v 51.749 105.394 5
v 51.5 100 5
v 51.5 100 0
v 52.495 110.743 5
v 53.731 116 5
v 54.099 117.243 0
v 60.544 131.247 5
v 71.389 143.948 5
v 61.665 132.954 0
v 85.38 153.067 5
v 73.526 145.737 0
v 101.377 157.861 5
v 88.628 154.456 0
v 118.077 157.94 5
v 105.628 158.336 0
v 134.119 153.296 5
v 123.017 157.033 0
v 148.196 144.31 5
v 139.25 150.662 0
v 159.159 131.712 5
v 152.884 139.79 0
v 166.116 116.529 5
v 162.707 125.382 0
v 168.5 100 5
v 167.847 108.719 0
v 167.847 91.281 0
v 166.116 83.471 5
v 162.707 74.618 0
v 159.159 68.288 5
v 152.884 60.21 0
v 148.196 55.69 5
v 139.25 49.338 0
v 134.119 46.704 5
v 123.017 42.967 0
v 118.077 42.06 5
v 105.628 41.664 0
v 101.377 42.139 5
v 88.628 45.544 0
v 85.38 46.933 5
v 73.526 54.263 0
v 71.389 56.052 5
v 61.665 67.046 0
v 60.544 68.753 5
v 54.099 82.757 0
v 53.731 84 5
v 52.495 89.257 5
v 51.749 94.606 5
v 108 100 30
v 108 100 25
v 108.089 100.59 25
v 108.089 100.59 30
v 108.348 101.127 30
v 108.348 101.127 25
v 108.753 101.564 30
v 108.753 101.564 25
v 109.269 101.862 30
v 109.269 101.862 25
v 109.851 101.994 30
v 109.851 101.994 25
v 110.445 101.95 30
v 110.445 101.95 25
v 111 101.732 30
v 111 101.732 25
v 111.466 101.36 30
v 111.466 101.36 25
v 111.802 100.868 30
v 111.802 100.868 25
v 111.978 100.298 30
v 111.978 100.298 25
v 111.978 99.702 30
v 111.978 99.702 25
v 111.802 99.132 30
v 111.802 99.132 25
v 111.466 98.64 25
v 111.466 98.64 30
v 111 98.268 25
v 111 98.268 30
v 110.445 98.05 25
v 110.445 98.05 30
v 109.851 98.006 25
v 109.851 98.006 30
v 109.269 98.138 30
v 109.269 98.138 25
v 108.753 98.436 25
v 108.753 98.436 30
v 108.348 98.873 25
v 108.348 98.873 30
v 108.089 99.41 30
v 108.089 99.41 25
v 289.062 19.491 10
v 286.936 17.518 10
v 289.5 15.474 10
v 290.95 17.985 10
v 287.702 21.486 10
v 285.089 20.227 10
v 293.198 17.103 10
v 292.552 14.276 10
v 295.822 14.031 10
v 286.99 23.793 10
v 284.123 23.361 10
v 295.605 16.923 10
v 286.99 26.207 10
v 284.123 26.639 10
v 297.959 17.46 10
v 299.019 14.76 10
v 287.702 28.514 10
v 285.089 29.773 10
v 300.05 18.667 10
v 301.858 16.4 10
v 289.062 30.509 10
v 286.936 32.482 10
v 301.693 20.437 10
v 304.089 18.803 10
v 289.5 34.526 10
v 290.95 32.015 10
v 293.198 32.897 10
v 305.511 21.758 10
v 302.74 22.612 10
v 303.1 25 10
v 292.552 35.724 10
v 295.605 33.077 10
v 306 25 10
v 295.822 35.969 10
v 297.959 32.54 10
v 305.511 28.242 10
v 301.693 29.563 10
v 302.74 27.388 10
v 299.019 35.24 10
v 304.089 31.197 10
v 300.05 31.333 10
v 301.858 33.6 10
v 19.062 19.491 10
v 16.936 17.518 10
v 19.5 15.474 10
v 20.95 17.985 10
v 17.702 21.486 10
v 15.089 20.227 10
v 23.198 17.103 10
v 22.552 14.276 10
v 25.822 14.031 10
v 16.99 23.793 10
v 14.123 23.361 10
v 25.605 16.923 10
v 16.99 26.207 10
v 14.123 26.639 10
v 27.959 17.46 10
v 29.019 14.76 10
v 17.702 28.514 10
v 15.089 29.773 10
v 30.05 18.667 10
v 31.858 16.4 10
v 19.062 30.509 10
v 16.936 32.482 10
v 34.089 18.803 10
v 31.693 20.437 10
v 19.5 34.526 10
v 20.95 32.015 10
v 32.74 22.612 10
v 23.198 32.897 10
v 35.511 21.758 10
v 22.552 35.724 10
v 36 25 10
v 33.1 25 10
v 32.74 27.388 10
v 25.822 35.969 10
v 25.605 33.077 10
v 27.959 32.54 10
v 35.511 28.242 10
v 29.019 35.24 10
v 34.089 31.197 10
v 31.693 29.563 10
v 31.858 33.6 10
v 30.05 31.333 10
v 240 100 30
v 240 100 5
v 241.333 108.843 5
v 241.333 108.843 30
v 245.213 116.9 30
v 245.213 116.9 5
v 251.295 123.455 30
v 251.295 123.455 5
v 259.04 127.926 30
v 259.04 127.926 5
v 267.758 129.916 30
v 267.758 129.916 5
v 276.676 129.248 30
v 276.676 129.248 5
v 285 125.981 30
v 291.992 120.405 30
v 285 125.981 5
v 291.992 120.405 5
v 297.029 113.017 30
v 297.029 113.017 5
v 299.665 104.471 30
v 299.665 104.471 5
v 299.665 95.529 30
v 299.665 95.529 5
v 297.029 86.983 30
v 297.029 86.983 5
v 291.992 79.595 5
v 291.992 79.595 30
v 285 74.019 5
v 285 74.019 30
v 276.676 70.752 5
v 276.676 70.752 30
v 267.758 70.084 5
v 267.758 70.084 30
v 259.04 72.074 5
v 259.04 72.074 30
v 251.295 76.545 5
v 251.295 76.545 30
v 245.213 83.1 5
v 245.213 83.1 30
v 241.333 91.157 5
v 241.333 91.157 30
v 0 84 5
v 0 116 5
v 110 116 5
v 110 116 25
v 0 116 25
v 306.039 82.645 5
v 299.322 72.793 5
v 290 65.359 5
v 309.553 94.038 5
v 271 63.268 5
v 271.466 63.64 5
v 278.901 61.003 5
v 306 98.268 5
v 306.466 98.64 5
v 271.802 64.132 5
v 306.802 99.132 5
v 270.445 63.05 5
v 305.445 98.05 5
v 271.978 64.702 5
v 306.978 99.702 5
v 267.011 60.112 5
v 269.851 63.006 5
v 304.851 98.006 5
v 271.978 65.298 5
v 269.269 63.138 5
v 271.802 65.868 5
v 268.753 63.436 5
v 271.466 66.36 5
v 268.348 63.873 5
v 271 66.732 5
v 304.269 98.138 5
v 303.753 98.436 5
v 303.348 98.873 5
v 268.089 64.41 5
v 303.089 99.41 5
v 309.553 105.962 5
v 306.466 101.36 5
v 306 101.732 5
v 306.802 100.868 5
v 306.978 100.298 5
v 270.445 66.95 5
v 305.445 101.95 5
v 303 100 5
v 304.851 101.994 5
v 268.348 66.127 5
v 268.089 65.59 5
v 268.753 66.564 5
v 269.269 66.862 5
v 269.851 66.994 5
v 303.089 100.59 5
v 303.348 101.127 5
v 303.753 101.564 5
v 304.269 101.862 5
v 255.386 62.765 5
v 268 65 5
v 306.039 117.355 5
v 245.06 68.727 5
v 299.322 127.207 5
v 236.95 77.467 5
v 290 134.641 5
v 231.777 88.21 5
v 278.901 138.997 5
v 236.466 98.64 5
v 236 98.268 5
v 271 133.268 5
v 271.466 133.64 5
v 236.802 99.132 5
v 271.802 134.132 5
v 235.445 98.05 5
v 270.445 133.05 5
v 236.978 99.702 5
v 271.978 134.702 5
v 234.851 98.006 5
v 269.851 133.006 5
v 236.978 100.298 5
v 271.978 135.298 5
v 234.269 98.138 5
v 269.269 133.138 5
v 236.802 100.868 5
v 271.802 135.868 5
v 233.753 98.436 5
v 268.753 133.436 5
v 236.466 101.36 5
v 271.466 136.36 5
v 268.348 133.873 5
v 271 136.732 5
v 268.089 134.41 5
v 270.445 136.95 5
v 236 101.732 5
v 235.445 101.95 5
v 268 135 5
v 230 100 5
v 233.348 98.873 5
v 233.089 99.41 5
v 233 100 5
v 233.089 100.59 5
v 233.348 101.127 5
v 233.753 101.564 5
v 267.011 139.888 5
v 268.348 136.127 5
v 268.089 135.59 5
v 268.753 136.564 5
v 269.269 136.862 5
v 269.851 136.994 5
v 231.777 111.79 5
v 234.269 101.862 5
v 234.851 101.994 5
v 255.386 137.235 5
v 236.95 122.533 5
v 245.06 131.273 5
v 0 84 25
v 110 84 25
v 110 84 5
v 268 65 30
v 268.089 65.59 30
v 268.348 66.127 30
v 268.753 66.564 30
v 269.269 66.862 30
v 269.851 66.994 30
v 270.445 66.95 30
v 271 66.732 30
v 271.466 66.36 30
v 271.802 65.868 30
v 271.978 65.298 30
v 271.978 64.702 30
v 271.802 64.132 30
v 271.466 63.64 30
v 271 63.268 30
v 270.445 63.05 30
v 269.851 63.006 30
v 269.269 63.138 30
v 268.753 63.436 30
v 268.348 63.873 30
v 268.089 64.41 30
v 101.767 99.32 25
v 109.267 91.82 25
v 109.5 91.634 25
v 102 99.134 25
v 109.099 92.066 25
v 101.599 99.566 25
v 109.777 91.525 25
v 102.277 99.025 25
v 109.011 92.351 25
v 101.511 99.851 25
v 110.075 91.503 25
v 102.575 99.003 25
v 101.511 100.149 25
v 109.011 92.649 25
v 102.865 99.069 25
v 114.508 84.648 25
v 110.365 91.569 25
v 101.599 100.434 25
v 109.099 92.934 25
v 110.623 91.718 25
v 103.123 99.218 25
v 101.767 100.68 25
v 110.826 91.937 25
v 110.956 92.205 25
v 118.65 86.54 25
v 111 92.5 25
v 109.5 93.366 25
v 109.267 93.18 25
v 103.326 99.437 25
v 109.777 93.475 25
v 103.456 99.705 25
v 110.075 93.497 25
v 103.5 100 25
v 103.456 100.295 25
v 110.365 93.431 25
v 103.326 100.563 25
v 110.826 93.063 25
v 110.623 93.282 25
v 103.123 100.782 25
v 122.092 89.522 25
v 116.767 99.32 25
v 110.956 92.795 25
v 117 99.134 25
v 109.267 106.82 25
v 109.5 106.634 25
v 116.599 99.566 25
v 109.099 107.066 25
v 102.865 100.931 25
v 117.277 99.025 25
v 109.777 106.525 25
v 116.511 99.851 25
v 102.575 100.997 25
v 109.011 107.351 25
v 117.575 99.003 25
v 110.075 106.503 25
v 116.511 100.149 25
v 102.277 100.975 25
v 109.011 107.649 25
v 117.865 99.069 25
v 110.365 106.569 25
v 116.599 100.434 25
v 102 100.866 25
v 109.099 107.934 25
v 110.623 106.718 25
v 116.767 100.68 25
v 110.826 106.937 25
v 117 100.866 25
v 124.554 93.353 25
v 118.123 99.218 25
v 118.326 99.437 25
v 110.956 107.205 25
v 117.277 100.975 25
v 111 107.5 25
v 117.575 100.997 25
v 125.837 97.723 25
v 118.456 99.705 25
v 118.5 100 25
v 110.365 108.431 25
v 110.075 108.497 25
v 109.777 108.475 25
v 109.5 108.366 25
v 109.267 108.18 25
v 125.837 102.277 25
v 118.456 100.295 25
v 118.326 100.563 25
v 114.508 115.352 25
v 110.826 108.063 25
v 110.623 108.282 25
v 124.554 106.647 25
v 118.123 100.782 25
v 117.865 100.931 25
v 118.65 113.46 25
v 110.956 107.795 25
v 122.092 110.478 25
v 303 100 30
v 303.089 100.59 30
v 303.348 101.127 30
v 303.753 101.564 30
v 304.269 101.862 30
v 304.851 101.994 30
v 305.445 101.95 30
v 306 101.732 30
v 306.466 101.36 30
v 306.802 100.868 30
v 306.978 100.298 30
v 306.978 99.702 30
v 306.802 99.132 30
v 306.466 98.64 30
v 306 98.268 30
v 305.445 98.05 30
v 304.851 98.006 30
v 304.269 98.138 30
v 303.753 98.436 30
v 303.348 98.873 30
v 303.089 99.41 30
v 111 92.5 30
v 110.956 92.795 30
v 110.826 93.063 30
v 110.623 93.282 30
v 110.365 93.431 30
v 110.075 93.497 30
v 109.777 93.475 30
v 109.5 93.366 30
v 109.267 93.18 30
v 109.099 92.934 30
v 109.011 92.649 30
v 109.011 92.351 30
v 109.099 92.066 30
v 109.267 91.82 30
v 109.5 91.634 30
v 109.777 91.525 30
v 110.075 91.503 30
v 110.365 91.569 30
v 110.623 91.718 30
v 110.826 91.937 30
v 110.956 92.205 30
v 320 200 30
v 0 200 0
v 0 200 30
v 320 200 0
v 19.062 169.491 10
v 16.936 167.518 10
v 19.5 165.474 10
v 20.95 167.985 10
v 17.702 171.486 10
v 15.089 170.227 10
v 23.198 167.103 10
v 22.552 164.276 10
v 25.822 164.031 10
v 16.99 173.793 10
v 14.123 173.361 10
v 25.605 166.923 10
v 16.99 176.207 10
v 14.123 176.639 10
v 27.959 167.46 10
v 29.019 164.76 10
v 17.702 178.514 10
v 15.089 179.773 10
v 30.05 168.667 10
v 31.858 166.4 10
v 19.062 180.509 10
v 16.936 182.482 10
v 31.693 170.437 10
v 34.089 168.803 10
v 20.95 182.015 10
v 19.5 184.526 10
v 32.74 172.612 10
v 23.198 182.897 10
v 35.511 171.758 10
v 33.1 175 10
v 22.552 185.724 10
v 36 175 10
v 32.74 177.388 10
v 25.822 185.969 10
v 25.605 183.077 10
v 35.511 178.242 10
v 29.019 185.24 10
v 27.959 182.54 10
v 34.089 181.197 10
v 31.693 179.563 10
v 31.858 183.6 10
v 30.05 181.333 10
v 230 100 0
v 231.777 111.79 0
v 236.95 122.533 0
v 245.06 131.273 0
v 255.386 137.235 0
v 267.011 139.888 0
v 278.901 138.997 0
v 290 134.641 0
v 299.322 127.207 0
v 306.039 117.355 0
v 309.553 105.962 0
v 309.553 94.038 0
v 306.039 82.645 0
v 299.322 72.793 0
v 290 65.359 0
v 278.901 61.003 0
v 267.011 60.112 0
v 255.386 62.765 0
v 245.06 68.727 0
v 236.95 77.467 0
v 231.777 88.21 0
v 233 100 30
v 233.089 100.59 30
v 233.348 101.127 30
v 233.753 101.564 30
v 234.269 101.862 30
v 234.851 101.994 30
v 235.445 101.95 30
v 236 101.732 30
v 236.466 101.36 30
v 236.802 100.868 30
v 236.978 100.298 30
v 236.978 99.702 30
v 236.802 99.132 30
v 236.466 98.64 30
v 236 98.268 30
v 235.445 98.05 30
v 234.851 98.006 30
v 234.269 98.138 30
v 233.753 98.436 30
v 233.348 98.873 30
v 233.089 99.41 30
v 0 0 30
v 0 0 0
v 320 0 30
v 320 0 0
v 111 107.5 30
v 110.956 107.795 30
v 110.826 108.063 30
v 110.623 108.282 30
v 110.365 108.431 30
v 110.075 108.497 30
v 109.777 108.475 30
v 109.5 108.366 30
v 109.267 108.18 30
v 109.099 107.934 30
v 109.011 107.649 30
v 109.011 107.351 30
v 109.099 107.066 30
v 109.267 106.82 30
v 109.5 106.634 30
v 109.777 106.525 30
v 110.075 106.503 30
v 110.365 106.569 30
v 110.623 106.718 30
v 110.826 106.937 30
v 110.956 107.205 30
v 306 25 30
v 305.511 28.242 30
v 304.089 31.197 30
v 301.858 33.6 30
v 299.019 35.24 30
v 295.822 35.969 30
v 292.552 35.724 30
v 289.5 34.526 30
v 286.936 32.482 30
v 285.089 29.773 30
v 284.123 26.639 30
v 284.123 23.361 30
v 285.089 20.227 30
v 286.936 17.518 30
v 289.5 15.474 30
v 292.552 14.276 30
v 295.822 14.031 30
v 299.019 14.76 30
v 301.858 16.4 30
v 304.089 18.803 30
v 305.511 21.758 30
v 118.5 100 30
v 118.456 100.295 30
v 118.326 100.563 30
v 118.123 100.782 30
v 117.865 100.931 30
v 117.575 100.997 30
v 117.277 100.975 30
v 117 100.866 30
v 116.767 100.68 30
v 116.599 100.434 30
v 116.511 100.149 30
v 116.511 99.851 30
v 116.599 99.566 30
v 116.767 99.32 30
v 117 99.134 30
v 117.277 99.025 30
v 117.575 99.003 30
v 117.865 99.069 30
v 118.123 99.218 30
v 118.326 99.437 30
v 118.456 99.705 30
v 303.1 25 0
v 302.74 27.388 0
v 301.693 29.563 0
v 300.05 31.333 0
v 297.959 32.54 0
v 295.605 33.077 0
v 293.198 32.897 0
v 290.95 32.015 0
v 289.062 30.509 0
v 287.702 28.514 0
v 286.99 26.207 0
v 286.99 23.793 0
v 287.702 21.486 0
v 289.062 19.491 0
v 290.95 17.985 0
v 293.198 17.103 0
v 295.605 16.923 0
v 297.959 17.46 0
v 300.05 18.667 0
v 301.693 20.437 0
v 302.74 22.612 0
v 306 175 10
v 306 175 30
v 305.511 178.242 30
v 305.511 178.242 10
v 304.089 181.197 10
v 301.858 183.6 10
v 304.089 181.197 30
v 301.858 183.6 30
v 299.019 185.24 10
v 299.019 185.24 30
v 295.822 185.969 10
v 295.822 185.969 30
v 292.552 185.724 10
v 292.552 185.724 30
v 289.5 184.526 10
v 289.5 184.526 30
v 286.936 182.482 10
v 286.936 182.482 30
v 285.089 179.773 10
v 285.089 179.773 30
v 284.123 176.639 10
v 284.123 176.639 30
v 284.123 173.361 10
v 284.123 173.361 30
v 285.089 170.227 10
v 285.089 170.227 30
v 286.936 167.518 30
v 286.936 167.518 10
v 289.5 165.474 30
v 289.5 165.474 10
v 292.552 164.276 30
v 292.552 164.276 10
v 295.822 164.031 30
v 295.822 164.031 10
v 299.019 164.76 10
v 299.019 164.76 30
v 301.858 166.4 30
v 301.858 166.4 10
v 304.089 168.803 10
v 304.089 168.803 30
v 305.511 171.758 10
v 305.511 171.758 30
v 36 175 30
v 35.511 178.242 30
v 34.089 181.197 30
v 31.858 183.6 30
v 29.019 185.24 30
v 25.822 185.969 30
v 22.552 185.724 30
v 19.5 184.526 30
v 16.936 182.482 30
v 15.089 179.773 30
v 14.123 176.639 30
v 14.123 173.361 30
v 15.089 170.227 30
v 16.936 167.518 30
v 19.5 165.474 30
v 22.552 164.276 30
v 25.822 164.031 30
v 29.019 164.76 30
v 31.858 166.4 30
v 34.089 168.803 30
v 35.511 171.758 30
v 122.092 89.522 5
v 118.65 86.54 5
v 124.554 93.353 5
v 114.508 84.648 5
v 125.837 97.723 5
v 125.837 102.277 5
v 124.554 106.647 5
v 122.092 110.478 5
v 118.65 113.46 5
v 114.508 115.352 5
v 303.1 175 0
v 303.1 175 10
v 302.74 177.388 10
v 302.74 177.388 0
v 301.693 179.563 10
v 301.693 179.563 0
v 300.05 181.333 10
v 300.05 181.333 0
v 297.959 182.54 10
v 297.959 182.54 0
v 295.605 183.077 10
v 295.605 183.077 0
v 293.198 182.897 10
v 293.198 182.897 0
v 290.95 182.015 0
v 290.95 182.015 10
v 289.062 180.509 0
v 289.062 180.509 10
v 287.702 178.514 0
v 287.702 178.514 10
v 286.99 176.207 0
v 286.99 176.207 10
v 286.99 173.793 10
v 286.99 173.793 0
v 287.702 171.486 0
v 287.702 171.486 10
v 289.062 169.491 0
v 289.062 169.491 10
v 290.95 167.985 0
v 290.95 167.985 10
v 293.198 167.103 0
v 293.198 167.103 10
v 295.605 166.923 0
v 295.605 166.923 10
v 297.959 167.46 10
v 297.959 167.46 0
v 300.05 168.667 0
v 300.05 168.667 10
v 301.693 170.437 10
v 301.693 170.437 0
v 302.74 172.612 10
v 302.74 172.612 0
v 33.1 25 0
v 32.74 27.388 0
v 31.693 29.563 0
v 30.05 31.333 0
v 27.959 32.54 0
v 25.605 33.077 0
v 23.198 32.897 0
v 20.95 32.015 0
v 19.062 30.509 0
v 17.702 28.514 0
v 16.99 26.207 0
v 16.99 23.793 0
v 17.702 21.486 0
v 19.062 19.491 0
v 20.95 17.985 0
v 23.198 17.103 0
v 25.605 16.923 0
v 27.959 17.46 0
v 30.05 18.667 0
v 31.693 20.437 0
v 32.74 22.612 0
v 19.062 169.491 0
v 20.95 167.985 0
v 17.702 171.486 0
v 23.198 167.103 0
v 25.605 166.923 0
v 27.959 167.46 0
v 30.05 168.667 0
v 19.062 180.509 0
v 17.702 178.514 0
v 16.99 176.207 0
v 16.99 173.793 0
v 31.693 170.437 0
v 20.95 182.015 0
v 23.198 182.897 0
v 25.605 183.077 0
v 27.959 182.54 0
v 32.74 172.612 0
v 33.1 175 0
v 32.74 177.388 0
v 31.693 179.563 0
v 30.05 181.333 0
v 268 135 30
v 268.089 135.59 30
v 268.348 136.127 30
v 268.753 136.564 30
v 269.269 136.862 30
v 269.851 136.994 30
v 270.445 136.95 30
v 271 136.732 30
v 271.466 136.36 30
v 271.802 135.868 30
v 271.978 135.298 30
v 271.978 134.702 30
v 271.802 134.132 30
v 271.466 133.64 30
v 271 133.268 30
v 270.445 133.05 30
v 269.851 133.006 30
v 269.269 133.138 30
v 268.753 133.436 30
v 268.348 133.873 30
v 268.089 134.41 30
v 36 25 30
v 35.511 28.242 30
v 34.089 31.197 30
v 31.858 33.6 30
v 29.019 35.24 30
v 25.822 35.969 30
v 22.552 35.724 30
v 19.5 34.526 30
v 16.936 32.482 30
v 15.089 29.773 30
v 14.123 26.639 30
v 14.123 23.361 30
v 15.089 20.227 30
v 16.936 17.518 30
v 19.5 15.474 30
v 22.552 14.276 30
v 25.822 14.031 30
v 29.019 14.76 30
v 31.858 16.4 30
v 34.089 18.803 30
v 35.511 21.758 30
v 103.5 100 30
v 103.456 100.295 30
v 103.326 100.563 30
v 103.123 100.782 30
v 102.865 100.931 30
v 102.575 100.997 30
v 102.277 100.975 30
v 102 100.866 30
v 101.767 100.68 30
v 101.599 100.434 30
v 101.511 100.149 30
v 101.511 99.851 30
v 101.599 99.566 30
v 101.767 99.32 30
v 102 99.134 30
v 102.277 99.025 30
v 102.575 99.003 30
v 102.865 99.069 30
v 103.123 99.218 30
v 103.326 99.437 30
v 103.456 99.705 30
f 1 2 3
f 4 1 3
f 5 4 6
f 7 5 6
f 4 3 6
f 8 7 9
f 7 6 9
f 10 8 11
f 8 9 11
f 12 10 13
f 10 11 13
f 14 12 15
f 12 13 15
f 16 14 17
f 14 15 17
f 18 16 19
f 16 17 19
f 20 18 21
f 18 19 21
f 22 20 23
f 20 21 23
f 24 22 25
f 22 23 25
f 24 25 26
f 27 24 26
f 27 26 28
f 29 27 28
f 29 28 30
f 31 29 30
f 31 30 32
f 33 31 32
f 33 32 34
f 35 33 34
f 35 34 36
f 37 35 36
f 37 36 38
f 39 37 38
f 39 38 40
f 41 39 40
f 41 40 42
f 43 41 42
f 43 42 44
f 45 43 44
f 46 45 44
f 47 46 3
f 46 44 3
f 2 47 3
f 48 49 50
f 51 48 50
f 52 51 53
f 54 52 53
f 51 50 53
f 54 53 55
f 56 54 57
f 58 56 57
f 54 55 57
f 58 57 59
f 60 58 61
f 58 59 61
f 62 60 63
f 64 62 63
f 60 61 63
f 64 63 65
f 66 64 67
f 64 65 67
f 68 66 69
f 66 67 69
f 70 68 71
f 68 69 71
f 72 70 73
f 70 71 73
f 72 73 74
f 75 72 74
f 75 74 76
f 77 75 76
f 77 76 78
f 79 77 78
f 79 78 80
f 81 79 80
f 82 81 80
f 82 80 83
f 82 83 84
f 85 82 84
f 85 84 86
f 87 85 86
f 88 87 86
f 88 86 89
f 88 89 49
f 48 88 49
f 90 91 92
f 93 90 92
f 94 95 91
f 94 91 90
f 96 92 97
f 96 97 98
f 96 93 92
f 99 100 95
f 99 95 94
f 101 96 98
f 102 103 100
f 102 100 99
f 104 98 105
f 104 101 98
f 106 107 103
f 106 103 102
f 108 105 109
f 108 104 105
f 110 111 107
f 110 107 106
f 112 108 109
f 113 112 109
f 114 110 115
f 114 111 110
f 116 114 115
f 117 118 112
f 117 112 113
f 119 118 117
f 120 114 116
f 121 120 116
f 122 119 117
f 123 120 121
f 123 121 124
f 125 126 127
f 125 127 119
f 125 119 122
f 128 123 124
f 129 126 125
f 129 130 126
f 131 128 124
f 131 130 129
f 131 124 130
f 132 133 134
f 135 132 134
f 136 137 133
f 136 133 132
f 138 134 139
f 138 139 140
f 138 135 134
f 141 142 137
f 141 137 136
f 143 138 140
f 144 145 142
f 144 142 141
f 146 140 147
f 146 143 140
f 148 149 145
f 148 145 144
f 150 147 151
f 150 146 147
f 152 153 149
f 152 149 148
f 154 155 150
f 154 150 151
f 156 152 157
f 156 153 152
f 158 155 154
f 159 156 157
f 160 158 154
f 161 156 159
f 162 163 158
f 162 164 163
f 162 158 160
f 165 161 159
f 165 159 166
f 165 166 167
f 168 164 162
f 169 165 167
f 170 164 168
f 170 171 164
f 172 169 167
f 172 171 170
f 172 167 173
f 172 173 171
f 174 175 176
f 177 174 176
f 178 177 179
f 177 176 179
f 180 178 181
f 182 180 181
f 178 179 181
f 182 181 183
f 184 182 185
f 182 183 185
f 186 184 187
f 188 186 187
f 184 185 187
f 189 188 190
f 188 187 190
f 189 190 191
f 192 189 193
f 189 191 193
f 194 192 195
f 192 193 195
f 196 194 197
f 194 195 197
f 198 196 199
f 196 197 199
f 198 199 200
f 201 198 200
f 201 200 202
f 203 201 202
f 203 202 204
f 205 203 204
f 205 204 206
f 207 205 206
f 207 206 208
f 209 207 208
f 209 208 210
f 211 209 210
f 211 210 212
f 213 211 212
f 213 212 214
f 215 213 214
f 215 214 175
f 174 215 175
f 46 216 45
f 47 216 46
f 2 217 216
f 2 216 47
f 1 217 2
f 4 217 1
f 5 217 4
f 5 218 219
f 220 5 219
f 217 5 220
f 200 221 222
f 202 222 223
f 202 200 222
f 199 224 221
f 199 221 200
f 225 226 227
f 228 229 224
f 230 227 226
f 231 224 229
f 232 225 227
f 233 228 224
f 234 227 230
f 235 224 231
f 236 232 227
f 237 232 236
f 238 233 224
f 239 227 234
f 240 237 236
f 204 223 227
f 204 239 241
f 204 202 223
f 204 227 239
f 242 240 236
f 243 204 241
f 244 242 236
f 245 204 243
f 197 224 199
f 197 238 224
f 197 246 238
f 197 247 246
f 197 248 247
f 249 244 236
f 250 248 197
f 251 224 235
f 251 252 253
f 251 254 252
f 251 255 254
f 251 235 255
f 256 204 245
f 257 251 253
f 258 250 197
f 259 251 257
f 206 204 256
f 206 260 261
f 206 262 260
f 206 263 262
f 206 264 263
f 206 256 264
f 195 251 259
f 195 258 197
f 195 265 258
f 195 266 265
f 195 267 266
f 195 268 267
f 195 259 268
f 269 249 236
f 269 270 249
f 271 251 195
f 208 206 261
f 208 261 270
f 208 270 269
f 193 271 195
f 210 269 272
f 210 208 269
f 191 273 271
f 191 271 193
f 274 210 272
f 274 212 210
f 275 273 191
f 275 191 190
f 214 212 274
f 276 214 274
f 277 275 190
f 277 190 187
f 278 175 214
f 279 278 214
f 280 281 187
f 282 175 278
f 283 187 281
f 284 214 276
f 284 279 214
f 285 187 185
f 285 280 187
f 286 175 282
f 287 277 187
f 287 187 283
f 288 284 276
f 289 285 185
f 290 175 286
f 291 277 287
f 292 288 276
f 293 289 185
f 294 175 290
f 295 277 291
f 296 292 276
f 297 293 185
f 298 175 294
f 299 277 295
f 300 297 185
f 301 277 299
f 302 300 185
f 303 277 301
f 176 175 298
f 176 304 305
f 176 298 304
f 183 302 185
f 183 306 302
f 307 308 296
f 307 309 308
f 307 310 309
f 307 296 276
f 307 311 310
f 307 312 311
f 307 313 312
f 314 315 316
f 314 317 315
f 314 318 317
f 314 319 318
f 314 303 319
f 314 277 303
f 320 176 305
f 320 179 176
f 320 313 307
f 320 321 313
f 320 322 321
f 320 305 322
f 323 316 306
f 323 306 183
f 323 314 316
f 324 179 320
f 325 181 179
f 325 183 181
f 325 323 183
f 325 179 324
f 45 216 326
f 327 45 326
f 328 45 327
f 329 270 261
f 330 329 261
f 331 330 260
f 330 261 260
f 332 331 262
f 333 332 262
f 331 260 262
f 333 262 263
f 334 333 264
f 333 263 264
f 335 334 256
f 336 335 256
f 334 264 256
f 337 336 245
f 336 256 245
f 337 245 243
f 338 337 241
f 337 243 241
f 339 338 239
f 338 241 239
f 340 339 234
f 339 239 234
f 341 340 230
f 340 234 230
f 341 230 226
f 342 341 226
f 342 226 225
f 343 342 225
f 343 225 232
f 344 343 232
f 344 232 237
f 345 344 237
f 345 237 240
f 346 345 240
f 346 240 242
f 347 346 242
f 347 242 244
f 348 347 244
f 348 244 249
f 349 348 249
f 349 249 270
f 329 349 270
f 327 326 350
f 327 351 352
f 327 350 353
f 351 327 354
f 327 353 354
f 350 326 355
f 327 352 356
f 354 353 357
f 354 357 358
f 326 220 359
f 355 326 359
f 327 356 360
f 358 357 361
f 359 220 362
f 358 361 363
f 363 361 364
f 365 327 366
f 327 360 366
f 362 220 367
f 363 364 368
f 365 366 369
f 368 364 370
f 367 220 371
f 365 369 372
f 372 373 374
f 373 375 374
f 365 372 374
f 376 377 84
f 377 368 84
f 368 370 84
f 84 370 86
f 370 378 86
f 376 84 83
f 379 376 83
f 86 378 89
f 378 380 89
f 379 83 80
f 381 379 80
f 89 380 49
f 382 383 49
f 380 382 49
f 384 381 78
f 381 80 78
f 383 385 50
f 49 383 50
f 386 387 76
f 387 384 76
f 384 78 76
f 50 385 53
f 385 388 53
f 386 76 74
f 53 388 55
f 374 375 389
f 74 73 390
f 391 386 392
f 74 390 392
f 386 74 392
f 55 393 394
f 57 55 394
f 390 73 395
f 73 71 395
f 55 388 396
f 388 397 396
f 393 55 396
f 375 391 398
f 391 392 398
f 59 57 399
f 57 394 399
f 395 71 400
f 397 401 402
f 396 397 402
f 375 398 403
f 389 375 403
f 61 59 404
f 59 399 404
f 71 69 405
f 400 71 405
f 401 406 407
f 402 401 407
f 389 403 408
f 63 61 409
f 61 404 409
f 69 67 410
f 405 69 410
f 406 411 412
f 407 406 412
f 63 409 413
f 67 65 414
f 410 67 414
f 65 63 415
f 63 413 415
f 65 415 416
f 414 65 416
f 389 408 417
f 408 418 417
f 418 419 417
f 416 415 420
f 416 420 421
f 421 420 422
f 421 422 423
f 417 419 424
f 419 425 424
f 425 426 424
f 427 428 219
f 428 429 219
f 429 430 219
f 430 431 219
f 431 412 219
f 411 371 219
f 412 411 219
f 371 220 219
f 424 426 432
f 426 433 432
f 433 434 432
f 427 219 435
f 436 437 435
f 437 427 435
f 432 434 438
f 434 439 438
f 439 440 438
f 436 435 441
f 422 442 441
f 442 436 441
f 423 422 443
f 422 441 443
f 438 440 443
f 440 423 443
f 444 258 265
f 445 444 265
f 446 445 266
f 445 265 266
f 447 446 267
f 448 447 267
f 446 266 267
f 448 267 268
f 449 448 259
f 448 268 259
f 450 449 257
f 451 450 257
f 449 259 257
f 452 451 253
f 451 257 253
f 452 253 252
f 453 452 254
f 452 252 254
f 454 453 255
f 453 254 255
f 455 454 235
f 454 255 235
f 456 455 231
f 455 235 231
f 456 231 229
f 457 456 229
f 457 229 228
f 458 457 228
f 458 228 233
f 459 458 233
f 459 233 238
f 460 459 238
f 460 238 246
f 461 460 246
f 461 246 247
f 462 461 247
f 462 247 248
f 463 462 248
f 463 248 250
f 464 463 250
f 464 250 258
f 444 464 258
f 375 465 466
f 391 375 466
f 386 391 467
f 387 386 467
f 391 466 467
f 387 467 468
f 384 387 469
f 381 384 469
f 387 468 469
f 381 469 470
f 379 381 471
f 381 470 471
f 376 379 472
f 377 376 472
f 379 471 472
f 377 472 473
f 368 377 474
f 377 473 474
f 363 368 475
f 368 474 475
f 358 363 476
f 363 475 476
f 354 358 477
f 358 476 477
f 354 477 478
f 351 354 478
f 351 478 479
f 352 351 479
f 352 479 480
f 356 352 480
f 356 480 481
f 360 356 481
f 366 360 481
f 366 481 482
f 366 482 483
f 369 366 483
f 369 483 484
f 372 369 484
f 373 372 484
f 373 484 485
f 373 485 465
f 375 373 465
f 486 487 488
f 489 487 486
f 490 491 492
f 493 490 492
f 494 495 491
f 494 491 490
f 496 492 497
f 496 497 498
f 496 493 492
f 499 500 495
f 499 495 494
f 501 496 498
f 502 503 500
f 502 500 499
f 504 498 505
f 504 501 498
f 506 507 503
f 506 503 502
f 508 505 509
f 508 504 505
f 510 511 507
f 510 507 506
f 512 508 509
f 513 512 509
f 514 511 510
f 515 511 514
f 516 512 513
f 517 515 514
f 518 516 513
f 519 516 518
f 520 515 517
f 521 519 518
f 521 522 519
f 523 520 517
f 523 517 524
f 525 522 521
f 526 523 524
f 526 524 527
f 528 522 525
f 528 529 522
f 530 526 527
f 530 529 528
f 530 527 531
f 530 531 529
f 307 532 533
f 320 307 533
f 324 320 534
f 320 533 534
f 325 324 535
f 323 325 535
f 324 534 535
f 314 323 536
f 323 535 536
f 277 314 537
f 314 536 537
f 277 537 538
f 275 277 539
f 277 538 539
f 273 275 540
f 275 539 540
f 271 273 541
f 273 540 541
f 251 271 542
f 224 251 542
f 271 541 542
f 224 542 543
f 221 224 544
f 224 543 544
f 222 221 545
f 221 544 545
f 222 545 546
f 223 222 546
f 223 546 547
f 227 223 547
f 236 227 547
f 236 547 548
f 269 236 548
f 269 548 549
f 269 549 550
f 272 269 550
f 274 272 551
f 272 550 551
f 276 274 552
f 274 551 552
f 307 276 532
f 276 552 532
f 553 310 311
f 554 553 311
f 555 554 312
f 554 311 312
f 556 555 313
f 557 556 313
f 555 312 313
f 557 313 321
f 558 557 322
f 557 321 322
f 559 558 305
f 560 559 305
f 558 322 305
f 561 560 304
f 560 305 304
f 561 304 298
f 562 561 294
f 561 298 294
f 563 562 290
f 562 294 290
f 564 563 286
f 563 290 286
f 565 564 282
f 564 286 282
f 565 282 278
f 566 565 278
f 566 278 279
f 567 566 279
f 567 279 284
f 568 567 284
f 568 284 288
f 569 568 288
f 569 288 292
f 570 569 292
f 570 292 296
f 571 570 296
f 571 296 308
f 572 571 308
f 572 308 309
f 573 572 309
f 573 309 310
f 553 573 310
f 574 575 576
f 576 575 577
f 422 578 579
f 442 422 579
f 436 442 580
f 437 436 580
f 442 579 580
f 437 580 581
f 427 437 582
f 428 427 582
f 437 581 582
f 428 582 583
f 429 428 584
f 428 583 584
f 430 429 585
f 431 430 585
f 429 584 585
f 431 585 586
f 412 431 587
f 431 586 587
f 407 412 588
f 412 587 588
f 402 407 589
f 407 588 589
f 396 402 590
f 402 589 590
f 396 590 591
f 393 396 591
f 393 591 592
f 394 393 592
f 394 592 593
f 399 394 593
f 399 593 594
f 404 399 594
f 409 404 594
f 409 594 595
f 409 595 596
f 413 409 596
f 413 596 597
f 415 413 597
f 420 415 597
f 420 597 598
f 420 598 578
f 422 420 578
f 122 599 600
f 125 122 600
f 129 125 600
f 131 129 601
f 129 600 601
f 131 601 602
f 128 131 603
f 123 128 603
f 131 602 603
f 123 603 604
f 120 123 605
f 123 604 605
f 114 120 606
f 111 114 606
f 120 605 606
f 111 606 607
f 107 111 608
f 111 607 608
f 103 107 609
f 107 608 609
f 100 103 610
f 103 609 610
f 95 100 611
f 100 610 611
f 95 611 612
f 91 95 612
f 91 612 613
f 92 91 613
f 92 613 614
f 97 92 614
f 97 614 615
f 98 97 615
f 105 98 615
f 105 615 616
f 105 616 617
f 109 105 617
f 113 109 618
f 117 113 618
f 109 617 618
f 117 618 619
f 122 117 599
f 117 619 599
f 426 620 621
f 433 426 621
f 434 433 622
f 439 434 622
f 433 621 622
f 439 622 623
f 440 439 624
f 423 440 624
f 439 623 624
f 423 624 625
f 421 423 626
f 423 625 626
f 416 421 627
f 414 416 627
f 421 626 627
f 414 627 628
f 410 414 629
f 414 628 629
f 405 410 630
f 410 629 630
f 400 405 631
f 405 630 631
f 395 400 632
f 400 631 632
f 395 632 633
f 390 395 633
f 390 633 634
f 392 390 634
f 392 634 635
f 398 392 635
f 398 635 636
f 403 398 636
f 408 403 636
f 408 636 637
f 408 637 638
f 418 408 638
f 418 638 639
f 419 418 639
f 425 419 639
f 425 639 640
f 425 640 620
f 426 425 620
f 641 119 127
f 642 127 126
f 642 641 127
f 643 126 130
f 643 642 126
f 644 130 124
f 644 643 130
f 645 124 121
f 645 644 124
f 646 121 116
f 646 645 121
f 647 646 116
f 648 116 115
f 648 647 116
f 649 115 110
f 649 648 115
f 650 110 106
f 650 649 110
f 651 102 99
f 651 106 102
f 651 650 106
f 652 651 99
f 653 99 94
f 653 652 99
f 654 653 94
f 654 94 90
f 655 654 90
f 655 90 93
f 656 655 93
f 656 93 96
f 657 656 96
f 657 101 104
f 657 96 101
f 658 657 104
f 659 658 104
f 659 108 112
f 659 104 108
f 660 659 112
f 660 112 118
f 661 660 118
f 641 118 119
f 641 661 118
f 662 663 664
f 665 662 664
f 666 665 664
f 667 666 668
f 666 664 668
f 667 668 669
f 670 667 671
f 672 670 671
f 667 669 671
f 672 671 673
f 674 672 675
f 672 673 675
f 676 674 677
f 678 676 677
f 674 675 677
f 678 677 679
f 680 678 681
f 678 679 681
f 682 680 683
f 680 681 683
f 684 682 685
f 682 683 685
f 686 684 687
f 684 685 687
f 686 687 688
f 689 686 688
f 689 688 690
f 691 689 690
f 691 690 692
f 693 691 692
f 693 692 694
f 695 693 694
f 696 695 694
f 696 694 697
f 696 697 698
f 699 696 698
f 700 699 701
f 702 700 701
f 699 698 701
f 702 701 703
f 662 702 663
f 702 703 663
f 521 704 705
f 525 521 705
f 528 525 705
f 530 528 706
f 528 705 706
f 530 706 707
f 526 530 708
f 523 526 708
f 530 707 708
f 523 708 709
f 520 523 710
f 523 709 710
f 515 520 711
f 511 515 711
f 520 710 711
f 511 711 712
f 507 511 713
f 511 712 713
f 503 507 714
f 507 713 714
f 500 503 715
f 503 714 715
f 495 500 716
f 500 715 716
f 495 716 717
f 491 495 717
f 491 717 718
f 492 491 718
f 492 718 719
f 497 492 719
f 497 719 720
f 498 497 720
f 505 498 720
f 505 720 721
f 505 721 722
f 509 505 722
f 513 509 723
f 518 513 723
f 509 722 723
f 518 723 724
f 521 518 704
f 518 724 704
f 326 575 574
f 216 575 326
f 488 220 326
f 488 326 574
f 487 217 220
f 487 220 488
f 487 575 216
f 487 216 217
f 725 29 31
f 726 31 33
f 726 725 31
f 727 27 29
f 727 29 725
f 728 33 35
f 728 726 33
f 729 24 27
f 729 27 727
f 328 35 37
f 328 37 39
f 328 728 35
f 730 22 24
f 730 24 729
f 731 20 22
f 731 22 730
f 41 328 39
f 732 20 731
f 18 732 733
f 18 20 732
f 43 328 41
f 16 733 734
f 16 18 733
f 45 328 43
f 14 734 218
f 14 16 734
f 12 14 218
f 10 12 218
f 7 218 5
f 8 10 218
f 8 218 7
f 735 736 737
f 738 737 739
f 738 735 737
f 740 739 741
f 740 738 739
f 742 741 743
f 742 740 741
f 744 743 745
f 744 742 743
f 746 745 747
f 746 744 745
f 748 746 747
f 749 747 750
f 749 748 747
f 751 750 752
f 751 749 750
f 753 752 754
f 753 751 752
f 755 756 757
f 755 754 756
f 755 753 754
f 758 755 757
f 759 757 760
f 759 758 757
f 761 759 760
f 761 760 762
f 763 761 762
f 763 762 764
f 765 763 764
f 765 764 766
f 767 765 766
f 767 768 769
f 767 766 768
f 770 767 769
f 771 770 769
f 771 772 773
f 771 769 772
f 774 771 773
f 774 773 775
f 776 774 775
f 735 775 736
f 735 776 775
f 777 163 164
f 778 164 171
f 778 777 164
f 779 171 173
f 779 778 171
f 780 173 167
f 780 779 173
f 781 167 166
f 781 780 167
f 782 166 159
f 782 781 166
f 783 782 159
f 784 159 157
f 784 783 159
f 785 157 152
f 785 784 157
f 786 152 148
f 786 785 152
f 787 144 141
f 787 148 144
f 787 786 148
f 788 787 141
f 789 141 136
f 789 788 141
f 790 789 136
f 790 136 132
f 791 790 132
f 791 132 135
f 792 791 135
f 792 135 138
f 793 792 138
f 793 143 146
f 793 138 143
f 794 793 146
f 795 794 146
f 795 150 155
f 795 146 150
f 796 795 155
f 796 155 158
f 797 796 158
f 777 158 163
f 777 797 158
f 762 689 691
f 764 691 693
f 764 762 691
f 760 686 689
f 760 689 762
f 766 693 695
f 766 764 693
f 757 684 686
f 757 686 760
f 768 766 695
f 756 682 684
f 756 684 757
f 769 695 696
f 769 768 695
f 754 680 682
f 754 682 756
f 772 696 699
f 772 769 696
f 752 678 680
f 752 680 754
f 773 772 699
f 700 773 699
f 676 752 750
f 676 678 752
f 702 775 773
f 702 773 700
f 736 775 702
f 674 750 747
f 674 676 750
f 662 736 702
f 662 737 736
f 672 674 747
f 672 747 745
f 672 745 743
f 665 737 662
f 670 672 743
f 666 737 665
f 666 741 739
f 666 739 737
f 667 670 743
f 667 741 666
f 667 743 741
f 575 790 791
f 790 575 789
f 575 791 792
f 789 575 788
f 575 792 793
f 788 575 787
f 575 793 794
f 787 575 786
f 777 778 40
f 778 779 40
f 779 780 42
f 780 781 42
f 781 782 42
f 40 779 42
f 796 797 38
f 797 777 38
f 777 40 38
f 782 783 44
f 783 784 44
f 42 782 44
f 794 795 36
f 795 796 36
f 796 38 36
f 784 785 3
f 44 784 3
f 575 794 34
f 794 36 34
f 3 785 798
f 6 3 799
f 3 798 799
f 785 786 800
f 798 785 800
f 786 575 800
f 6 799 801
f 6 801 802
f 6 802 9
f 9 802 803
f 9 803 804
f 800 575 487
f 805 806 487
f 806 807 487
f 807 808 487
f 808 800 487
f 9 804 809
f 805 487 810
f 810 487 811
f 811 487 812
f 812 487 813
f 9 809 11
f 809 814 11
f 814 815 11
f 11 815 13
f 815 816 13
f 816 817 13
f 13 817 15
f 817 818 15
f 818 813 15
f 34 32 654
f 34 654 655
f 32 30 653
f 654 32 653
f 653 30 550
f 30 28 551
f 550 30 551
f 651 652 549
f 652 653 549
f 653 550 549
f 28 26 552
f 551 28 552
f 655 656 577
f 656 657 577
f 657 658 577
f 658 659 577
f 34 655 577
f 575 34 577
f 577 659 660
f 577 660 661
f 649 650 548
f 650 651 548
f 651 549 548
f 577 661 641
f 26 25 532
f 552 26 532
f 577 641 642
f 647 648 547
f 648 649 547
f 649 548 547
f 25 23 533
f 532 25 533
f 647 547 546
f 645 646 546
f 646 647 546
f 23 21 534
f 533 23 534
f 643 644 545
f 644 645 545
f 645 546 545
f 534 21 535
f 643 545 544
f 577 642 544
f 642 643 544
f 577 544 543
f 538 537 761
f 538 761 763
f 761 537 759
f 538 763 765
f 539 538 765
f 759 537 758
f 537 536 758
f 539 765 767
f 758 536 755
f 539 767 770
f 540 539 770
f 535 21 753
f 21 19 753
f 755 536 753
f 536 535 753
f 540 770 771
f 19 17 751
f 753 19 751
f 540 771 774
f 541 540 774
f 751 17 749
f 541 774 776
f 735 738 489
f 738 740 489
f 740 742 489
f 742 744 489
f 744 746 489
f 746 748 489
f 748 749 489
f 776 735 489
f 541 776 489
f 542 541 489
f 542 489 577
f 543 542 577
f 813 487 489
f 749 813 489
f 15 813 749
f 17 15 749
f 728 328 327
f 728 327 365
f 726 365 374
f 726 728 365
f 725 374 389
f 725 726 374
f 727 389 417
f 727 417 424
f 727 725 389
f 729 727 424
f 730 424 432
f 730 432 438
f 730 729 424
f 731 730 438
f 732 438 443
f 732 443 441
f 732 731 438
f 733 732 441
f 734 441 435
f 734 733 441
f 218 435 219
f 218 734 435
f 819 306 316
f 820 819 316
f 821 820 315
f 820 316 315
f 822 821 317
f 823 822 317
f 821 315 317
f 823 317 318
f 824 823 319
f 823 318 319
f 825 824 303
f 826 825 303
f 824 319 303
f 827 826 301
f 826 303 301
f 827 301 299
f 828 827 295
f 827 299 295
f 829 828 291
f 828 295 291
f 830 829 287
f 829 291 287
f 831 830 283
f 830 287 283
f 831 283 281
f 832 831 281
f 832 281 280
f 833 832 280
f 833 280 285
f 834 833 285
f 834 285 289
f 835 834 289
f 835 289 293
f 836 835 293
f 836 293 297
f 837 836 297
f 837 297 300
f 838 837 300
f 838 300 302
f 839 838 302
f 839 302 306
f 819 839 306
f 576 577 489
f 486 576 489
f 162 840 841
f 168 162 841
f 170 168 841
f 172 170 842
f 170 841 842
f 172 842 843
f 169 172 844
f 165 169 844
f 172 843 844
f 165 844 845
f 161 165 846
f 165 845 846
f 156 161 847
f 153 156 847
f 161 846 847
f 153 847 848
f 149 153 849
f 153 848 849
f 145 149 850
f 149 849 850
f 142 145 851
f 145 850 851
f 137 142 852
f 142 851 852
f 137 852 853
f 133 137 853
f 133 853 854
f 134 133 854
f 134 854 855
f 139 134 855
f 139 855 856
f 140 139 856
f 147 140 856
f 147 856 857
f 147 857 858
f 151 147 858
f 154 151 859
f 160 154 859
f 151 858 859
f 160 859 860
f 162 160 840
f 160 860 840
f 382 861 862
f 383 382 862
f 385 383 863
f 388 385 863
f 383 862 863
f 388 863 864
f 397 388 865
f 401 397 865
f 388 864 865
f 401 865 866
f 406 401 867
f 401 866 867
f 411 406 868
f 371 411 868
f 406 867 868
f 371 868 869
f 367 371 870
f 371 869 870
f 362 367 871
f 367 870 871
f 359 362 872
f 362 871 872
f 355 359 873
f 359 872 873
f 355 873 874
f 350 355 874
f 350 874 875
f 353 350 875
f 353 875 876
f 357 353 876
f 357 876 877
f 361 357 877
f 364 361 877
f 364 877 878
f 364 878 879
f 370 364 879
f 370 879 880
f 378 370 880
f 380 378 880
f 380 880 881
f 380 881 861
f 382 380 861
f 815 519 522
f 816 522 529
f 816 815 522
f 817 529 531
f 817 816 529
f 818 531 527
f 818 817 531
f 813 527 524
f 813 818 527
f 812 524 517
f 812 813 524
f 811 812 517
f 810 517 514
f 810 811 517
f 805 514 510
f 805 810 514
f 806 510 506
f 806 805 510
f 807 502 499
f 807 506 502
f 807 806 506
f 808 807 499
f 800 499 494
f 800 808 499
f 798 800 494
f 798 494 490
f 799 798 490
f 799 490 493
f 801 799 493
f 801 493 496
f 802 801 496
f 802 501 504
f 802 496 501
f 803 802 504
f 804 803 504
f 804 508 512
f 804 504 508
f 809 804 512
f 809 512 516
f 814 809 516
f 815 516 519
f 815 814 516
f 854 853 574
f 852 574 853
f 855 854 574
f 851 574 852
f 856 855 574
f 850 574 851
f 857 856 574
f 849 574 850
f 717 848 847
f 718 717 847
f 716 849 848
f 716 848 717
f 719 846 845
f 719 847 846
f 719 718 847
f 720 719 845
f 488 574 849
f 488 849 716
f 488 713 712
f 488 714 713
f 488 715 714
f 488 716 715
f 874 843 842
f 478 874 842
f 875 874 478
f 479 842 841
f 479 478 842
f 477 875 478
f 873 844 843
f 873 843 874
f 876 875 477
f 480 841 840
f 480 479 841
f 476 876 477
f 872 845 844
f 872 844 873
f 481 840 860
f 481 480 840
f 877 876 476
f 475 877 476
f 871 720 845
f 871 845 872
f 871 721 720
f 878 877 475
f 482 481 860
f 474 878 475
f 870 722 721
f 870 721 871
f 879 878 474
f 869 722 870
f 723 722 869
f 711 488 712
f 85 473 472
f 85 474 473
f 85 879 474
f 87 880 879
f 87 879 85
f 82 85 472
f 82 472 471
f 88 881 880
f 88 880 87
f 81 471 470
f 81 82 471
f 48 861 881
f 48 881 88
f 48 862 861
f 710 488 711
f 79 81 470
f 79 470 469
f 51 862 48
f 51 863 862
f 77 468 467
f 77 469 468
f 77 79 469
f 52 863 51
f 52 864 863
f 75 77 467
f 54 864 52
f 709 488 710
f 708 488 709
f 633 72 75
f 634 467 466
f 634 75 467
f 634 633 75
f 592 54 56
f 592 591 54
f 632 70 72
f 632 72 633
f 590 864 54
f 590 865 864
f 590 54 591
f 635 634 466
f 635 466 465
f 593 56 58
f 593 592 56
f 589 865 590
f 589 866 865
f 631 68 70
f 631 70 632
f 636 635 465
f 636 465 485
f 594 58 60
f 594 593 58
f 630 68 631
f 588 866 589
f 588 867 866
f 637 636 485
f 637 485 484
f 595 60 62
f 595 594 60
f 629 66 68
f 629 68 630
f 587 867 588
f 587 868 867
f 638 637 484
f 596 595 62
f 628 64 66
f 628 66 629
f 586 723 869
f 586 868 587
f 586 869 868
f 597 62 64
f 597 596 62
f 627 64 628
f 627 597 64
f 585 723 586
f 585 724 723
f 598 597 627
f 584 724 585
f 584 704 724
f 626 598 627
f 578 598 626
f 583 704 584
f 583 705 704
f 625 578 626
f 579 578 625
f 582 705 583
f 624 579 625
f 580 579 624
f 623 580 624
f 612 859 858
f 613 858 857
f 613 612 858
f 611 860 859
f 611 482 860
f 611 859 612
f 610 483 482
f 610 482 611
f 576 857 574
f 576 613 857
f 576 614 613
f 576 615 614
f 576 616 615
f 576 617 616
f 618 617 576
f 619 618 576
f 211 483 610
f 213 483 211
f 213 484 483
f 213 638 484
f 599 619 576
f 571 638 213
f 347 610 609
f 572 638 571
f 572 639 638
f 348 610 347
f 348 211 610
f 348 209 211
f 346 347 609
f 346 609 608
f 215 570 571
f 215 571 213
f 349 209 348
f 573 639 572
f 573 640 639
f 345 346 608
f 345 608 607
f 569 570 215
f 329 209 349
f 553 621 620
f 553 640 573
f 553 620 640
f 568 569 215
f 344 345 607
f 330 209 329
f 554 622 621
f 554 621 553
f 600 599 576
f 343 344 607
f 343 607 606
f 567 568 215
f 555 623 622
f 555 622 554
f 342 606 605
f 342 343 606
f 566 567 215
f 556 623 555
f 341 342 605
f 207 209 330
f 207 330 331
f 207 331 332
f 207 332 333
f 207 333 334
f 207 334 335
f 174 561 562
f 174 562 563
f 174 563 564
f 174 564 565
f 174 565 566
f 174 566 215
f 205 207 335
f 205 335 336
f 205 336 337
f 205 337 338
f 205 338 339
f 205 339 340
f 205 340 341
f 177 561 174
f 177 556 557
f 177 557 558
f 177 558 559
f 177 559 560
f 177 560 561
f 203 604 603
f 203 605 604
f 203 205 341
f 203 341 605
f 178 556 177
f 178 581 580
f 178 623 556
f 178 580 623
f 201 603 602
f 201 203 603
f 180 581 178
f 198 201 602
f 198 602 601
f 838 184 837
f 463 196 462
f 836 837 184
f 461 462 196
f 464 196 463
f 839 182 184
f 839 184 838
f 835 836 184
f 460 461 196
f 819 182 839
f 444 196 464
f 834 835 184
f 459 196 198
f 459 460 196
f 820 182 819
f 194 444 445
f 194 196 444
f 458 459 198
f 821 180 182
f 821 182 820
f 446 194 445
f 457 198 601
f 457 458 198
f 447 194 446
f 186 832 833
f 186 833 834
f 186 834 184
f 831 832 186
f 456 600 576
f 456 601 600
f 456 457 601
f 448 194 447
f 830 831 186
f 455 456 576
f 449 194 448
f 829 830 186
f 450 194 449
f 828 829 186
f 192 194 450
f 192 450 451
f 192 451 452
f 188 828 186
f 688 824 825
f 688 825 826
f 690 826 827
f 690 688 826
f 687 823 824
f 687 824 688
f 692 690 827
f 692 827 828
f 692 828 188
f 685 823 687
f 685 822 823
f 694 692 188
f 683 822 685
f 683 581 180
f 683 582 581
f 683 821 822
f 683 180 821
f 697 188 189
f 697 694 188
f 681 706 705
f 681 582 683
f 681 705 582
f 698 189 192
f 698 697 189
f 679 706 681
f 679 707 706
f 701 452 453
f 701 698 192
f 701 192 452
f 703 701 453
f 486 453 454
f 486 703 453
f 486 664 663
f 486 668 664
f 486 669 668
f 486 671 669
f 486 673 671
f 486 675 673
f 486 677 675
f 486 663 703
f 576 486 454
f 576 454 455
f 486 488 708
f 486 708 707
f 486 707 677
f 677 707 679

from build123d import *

# Parameters (mm, degrees)
SKETCH1_W           = 320
SKETCH1_H           = 200
SKETCH1_R           = 8.1
BOSS_EXTRUDE1_DEPTH = 30
SKETCH2_R           = 11
CUT_EXTRUDE1_DEPTH  = 20
SKETCH3_R           = 58.5
CUT_EXTRUDE2_DEPTH  = 5
CUT_EXTRUDE3_DEPTH  = 20
SKETCH5_R           = 2
CUT_EXTRUDE4_DEPTH  = 379.186461947
SKETCH6_R           = 40
CUT_EXTRUDE5_DEPTH  = 5
SKETCH7_R           = 30
CUT_EXTRUDE6_DEPTH  = 379.549864615
SKETCH8_R           = 2
CUT_EXTRUDE7_DEPTH  = 379.549864615
SKETCH9_R           = 1
CUT_EXTRUDE8_DEPTH  = 379.549864615


with BuildPart() as part:
    # Sketch1 → Boss-Extrude1 (new body)
    with BuildSketch(Plane.XY):
        with Locations((160, 100)):
            Rectangle(SKETCH1_W, SKETCH1_H)
        with Locations((25, 175)):
            Circle(SKETCH1_R, mode=Mode.SUBTRACT)
        with Locations((295, 175)):
            Circle(SKETCH1_R, mode=Mode.SUBTRACT)
        with Locations((25, 25)):
            Circle(SKETCH1_R, mode=Mode.SUBTRACT)
        with Locations((295, 25)):
            Circle(SKETCH1_R, mode=Mode.SUBTRACT)
    extrude(amount=BOSS_EXTRUDE1_DEPTH)

    # Sketch2 → Cut-Extrude1 (cut)
    with BuildSketch(Plane.XY.offset(30)):
        with Locations((295, 175)):
            Circle(SKETCH2_R)
        with Locations((25, 175)):
            Circle(SKETCH2_R)
        with Locations((25, 25)):
            Circle(SKETCH2_R)
        with Locations((295, 25)):
            Circle(SKETCH2_R)
    extrude(amount=-CUT_EXTRUDE1_DEPTH, mode=Mode.SUBTRACT)

    # Sketch3 → Cut-Extrude2 (cut)
    with BuildSketch(Plane(origin=(0, 0, 0), x_dir=(-1, 0, 0), z_dir=(0, 0, -1))):
        with Locations((-110, 100)):
            Circle(SKETCH3_R)
    extrude(amount=-CUT_EXTRUDE2_DEPTH, mode=Mode.SUBTRACT)

    # Sketch4 → Cut-Extrude3 (cut)
    with BuildSketch(Plane(origin=(0, 0, 5), x_dir=(-1, 0, 0), z_dir=(0, 0, -1))):
        with BuildLine():
            Line((-110, 116), (11.374075995, 116))
            Line((11.374075995, 116), (11.374075995, 84))
            Line((11.374075995, 84), (-110, 84))
            ThreePointArc((-110, 84), (-126, 100), (-110, 116))
        make_face()
    extrude(amount=-CUT_EXTRUDE3_DEPTH, mode=Mode.SUBTRACT)

    # Sketch5 → Cut-Extrude4 (cut, through all)
    with BuildSketch(Plane(origin=(0, 0, 25), x_dir=(-1, 0, 0), z_dir=(0, 0, -1))):
        with Locations((-110, 100)):
            Circle(SKETCH5_R)
    extrude(amount=-CUT_EXTRUDE4_DEPTH, mode=Mode.SUBTRACT)

    # Sketch6 → Cut-Extrude5 (cut)
    with BuildSketch(Plane(origin=(0, 0, 0), x_dir=(-1, 0, 0), z_dir=(0, 0, -1))):
        with Locations((-270, 100)):
            Circle(SKETCH6_R)
    extrude(amount=-CUT_EXTRUDE5_DEPTH, mode=Mode.SUBTRACT)

    # Sketch7 → Cut-Extrude6 (cut, through all)
    with BuildSketch(Plane(origin=(0, 0, 0), x_dir=(-1, 0, 0), z_dir=(0, 0, -1))):
        with Locations((-270, 100)):
            Circle(SKETCH7_R)
    extrude(amount=-CUT_EXTRUDE6_DEPTH, mode=Mode.SUBTRACT)

    # Sketch8 → Cut-Extrude7 (cut, through all)
    with BuildSketch(Plane(origin=(0, 0, 0), x_dir=(-1, 0, 0), z_dir=(0, 0, -1))):
        with Locations((-270, 135)):
            Circle(SKETCH8_R)
        with Locations((-235, 100)):
            Circle(SKETCH8_R)
        with Locations((-270, 65)):
            Circle(SKETCH8_R)
        with Locations((-305, 100)):
            Circle(SKETCH8_R)
    extrude(amount=-CUT_EXTRUDE7_DEPTH, mode=Mode.SUBTRACT)

    # Sketch9 → Cut-Extrude8 (cut, through all)
    with BuildSketch(Plane.XY.offset(30)):
        with Locations((110, 107.5)):
            Circle(SKETCH9_R)
        with Locations((117.5, 100)):
            Circle(SKETCH9_R)
        with Locations((110, 92.5)):
            Circle(SKETCH9_R)
        with Locations((102.5, 100)):
            Circle(SKETCH9_R)
    extrude(amount=-CUT_EXTRUDE8_DEPTH, mode=Mode.SUBTRACT)


solid = part.part
